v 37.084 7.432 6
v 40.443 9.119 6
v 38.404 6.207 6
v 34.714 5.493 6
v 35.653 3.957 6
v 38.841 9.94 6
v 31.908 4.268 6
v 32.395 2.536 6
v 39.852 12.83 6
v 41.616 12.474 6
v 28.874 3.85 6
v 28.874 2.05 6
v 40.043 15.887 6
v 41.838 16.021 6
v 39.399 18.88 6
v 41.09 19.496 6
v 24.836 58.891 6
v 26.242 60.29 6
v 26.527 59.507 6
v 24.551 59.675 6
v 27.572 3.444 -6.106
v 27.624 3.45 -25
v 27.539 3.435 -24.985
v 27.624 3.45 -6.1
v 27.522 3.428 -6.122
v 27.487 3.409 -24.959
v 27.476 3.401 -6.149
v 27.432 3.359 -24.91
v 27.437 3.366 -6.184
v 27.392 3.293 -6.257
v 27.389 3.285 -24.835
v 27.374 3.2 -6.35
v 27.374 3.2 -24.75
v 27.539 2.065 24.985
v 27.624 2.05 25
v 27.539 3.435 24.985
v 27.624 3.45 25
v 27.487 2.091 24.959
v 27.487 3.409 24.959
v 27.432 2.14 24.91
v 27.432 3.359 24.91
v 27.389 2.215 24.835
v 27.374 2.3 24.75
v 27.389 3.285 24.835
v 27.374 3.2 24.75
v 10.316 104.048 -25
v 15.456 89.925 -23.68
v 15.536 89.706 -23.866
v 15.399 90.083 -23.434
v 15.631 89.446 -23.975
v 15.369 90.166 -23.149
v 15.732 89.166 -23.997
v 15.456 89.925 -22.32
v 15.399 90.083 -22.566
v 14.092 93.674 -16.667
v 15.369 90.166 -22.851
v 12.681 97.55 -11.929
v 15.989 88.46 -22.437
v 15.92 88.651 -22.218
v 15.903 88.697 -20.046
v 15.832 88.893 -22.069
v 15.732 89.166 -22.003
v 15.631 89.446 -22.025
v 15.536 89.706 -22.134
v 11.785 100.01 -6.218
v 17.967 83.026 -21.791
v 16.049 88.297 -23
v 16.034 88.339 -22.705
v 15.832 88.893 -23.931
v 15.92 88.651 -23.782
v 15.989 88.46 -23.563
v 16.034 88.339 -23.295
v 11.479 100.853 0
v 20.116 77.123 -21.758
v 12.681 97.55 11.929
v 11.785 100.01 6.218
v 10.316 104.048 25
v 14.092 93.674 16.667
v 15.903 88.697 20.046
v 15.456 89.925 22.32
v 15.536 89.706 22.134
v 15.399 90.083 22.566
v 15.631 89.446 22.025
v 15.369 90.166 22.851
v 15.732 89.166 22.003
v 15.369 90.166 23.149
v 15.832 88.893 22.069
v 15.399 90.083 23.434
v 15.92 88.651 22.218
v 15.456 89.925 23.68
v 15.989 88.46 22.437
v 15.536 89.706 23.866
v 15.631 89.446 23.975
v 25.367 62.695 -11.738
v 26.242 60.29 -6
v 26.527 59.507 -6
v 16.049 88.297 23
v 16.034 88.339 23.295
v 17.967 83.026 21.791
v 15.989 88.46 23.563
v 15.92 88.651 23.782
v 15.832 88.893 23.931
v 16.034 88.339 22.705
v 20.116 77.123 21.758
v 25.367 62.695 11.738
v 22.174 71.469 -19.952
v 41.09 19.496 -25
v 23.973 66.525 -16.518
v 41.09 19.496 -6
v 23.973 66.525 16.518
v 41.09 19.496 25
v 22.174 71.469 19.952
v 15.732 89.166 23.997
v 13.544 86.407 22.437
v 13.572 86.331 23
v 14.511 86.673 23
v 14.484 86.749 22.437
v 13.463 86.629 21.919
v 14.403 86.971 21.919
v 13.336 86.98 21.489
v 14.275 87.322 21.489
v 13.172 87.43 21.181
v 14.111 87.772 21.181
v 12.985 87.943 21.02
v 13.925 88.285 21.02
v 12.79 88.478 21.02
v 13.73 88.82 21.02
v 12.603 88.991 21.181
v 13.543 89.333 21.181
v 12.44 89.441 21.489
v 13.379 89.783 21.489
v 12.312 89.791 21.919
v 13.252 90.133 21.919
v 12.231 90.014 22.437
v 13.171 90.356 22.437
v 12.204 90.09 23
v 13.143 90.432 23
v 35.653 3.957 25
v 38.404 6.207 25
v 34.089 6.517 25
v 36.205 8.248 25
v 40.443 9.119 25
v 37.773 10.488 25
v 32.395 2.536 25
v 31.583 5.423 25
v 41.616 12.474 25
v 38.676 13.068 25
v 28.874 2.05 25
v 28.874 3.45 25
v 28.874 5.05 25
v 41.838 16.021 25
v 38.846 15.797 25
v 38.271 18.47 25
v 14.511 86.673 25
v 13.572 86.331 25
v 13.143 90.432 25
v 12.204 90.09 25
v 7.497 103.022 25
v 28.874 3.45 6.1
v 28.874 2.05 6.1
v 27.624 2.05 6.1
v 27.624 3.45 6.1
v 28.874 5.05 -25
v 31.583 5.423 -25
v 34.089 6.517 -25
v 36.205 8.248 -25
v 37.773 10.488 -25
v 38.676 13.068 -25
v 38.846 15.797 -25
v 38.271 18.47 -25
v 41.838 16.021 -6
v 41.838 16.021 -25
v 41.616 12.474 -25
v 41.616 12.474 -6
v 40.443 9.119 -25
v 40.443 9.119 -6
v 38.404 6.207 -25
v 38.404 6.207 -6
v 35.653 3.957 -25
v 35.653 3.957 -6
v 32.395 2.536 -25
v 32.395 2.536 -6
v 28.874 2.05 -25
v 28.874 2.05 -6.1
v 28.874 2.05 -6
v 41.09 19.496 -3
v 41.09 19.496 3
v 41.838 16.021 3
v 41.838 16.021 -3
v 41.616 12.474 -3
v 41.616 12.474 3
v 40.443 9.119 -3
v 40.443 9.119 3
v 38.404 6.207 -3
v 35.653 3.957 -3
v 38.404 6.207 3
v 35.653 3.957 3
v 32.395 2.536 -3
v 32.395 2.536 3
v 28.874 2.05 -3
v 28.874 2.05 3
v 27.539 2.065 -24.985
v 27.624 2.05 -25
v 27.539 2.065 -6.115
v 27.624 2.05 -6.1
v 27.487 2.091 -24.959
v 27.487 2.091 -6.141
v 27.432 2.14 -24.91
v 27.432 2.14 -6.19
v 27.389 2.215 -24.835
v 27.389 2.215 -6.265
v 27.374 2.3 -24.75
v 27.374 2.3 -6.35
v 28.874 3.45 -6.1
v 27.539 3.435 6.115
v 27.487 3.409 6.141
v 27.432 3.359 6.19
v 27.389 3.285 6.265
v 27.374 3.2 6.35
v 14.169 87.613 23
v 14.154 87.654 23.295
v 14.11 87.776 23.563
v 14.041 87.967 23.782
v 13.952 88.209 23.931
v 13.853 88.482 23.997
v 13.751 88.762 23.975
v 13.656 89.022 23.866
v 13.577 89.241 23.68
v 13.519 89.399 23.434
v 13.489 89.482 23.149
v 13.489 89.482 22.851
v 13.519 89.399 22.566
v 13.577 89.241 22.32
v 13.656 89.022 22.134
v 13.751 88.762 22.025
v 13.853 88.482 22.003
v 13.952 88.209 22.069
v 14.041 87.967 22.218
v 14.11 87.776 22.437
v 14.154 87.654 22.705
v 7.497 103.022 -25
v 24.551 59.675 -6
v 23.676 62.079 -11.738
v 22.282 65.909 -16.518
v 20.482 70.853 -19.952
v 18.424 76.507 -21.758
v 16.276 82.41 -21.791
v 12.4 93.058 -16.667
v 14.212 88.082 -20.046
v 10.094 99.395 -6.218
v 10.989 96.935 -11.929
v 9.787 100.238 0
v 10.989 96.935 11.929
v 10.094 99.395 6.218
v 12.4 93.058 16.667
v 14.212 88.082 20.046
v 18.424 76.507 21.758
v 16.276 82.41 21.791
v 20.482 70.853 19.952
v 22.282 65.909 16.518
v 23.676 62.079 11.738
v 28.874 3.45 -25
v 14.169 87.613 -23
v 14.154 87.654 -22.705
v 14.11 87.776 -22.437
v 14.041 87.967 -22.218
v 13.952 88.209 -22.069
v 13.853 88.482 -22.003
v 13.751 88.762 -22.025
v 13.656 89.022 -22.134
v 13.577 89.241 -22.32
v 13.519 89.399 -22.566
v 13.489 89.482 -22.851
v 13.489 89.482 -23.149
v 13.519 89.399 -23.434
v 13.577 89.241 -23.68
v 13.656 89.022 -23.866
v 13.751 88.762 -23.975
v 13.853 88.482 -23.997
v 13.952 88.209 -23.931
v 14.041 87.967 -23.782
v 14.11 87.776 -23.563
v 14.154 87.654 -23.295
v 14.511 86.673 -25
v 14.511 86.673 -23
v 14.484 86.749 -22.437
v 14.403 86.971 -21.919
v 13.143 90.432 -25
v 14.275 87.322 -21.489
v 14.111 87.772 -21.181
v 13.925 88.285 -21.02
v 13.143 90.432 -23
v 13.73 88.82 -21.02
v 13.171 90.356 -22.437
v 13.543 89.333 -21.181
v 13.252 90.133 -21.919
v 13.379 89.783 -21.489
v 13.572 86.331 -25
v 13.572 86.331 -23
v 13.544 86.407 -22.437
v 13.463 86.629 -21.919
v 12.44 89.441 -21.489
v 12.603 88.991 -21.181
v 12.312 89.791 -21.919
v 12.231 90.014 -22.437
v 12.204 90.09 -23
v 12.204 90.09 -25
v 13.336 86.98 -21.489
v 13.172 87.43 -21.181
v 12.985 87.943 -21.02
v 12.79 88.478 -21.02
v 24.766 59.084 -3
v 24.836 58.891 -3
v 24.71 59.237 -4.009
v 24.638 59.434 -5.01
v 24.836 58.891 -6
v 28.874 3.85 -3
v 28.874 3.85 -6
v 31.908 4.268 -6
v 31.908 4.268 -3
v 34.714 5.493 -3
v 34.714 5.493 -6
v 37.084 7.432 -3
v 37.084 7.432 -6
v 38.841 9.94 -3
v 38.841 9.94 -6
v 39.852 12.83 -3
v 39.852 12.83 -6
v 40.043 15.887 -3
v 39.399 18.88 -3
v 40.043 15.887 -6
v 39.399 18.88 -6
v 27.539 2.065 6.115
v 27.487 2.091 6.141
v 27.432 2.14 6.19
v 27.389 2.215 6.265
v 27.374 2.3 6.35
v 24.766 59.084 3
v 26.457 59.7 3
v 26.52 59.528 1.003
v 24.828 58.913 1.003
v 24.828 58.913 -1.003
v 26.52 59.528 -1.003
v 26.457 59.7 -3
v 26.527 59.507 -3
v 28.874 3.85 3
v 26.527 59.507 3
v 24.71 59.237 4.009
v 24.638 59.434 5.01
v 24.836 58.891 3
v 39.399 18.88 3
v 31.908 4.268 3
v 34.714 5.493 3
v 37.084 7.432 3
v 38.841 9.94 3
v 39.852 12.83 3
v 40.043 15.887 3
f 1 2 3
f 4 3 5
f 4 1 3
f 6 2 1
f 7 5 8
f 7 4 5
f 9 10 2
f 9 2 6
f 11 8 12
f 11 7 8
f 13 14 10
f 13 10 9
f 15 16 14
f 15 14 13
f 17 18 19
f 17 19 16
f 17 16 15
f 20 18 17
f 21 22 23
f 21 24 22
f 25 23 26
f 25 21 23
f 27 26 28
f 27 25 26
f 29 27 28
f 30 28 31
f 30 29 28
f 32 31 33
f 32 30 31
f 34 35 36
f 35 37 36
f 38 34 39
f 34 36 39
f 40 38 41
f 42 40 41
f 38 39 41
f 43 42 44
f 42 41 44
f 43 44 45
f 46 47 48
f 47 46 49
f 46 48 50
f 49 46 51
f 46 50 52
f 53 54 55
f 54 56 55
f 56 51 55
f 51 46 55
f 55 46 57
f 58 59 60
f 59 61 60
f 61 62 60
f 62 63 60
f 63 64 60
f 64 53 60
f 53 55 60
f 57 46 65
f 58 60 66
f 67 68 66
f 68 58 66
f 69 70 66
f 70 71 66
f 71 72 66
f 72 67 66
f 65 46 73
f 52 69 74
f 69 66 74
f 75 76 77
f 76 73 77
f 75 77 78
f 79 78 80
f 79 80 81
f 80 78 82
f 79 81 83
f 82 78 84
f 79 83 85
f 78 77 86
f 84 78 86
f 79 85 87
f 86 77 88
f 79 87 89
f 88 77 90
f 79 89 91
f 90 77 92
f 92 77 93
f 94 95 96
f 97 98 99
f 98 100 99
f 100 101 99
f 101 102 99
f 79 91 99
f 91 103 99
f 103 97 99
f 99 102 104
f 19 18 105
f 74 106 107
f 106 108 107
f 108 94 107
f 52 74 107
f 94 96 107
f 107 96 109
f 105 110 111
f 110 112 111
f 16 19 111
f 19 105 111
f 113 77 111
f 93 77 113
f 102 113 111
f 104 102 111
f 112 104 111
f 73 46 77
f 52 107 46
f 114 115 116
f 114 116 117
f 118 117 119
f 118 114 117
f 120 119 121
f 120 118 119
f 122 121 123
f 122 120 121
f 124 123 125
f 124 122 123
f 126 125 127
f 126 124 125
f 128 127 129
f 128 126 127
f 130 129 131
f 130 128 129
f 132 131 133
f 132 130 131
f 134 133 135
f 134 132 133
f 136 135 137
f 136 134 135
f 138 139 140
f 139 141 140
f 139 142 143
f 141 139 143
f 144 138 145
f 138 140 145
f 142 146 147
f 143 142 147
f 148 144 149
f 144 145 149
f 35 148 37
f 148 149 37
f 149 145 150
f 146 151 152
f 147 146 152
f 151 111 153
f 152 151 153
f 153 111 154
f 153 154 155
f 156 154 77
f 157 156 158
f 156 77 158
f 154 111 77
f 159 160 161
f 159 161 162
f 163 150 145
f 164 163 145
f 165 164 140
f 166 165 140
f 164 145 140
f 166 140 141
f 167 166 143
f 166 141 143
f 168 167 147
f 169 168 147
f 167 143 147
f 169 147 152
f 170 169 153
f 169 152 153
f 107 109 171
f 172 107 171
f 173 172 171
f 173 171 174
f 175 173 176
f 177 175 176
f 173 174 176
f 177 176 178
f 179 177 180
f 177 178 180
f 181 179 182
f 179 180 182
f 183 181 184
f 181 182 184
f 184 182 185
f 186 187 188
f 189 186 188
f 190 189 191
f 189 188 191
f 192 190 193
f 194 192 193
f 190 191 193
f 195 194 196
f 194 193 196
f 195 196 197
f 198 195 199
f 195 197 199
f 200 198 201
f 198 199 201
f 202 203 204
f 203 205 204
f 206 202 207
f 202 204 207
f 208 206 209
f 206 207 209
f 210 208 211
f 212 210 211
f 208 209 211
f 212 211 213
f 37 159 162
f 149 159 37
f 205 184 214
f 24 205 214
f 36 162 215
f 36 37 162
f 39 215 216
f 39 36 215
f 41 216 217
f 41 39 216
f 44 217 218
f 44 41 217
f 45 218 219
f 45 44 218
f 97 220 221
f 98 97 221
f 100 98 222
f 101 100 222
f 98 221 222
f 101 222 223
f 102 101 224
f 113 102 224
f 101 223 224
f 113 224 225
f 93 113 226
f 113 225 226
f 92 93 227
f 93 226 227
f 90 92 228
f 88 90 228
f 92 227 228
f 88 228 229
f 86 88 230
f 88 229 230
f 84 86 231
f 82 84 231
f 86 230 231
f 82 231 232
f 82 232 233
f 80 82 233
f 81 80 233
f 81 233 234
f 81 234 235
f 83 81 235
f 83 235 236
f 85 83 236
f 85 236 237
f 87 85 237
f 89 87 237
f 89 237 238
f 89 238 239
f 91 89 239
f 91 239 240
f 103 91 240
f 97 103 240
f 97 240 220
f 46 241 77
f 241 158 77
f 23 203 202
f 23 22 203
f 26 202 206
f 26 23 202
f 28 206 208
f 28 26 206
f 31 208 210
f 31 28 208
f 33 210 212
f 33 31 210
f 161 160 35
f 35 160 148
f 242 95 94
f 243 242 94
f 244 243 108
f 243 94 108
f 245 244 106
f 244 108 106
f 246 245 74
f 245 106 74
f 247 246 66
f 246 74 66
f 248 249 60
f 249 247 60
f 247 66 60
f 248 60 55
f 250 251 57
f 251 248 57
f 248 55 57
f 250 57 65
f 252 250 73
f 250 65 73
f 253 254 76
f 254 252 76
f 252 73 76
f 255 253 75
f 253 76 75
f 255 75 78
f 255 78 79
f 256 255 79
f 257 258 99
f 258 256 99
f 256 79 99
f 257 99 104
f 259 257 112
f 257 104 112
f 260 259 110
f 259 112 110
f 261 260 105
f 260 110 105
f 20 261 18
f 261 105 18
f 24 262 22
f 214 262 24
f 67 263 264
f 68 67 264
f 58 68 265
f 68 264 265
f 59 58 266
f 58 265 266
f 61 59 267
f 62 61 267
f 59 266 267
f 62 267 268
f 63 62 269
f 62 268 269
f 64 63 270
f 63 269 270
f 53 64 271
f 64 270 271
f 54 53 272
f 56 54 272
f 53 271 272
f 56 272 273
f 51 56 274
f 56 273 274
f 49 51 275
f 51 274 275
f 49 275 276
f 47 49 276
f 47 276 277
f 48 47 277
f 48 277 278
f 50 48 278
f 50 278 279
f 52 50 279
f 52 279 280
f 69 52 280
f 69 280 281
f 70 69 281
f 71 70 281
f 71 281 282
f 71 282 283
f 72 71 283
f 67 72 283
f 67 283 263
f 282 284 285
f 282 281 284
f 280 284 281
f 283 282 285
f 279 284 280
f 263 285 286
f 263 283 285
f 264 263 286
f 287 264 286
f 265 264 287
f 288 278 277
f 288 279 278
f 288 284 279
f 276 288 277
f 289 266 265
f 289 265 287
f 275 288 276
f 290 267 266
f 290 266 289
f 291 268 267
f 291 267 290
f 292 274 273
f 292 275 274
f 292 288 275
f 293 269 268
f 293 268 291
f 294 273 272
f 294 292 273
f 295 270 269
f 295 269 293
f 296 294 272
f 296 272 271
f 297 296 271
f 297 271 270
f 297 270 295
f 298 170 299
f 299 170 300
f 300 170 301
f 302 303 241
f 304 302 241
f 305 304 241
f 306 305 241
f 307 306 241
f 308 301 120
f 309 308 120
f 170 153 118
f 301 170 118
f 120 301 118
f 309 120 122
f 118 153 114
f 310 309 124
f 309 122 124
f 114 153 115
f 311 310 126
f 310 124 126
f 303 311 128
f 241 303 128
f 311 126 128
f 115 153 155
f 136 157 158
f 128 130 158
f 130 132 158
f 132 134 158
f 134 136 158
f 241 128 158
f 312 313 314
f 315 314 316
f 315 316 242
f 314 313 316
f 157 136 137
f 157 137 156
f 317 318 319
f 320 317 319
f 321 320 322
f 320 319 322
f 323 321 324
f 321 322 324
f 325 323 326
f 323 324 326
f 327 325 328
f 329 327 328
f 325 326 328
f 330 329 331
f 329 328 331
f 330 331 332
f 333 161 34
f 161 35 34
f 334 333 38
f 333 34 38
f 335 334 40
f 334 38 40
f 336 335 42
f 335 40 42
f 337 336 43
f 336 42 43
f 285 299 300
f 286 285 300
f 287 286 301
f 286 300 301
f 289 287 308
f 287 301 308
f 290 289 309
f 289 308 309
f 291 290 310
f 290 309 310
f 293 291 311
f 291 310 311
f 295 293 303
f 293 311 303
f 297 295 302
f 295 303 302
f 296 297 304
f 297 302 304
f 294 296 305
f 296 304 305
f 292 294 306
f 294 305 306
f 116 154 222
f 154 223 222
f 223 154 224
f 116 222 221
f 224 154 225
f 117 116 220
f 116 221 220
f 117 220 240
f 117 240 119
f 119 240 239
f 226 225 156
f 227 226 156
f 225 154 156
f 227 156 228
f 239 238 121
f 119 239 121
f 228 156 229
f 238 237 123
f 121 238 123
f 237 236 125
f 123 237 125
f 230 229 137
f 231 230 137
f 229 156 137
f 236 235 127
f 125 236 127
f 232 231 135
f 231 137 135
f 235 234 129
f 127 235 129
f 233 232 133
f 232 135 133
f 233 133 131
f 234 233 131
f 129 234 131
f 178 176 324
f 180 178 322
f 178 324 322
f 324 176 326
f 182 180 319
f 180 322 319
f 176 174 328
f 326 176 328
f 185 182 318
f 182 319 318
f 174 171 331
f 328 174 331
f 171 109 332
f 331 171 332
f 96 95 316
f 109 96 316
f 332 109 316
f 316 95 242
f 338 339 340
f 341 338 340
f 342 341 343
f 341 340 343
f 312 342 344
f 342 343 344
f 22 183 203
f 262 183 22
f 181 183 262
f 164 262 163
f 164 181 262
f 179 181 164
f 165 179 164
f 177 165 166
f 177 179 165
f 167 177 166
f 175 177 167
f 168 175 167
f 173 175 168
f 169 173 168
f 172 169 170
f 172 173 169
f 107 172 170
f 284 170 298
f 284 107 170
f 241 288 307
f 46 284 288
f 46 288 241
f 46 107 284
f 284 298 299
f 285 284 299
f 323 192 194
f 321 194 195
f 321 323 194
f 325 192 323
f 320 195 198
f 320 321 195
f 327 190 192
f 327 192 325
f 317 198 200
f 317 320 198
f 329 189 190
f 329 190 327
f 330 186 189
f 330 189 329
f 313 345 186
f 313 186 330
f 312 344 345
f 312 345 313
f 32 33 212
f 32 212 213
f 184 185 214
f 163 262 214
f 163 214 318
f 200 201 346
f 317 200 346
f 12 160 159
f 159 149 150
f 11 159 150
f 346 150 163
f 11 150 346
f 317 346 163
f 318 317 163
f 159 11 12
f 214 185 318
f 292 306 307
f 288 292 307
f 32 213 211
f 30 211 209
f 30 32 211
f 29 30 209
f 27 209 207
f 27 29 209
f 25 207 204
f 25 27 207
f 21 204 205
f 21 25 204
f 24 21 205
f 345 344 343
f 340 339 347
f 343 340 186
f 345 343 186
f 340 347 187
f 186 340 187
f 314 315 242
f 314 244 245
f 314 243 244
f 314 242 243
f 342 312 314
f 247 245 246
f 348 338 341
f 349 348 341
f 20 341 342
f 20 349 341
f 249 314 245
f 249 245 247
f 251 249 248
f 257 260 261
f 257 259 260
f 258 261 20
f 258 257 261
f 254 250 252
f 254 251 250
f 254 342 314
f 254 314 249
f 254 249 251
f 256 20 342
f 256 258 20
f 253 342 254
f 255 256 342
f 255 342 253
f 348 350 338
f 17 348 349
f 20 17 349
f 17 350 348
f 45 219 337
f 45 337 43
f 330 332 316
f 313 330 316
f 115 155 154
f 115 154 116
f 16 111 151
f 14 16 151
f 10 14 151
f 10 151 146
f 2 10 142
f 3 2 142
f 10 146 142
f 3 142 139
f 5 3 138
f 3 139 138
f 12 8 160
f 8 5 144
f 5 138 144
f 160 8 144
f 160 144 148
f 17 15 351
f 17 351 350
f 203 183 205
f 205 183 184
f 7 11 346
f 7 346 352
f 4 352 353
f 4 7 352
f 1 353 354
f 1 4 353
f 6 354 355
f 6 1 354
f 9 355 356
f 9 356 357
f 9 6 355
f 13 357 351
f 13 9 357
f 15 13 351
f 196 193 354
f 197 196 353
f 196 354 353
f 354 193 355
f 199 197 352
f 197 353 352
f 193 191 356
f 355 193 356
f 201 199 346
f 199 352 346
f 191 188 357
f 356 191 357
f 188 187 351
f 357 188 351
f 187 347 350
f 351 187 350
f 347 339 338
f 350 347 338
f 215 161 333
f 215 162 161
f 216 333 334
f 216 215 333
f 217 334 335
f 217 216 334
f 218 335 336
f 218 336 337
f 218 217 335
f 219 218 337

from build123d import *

# Parameters (mm, degrees)
EXTRUDE_1_DEPTH        = 25
SKETCH_4_R             = 22
CUT_EXTRUDE_1_DEPTH    = 1.8
CUT_EXTRUDE_START      = 6
CUT_EXTRUDE_1_2_DEPTH  = 3
SKETCH_11_W            = 18.9
SKETCH_11_H            = 1.4
EXTRUDE_3_DEPTH        = 1.5
FILLET_1_R             = 0.25
SKETCH_12_R            = 1
CUT_EXTRUDE_2553_DEPTH = 99.437390504
CUT_EXTRUDE_1_3_DEPTH  = 1


with BuildPart() as part:
    # 草图2 → 整体拉伸-薄壁1 (new, symmetric)
    with BuildSketch(Plane.XY):
        with BuildLine():
            ThreePointArc((28.874192719, 5.049687275), (37.065713162, 9.313922912), (38.271118927, 18.469888708))
            Line((38.271118927, 18.469888708), (7.496652644, 103.022039918))
            Line((7.496652644, 103.022039918), (10.315730506, 104.048100348))
            Line((10.315730506, 104.048100348), (41.090196789, 19.495949138))
            ThreePointArc((41.090196789, 19.495949138), (39.523169295, 7.593193603), (28.874192719, 2.049687275))
            Line((28.874192719, 2.049687275), (28.874192719, 5.049687275))
        make_face()
    extrude(amount=EXTRUDE_1_DEPTH, both=True)

    # 草图4 → Cut-Extrude 1 (cut)
    with BuildSketch(Plane(origin=(42.549434126, 15.486727507, 0), x_dir=(0, 0, -1), z_dir=(0.9396926207859071, 0.3420201433256726, 0))):
        with Locations(Location((0, 68.845044478, 0), (0, 0, 90))):
            Circle(SKETCH_4_R)
    extrude(amount=-CUT_EXTRUDE_1_DEPTH, mode=Mode.SUBTRACT)

    # 草图3 → Cut-Extrude 1 2 (cut)
    with BuildSketch(Plane.XY.offset(CUT_EXTRUDE_START)):
        with BuildLine():
            ThreePointArc((28.874192719, 3.849687275), (38.048695615, 8.625631188), (39.398750072, 18.88031288))
            Line((39.398750072, 18.88031288), (24.836038582, 58.891033865))
            Line((24.836038582, 58.891033865), (23.809978152, 61.710111727))
            Line((23.809978152, 61.710111727), (25.50142487, 62.325747985))
            Line((25.50142487, 62.325747985), (26.5274853, 59.506670123))
            Line((26.5274853, 59.506670123), (41.090196789, 19.495949138))
            ThreePointArc((41.090196789, 19.495949138), (39.523169295, 7.593193603), (28.874192719, 2.049687275))
            Line((28.874192719, 2.049687275), (28.874192719, 3.849687275))
        make_face()
    cut_extrude_1_2 = extrude(amount=-CUT_EXTRUDE_1_2_DEPTH, mode=Mode.SUBTRACT)

    # 镜向1: Cut-Extrude 1 2 across plane
    add(cut_extrude_1_2.mirror(Plane.XY), mode=Mode.SUBTRACT)

    # 草图11 → 底部卡扣凸台-拉伸3 (add)
    with BuildSketch(Plane.ZY.offset(-28.874192719)):
        with Locations((-15.55, 2.749687275)):
            Rectangle(SKETCH_11_W, SKETCH_11_H)
        with Locations((15.55, 2.749687275)):
            Rectangle(SKETCH_11_W, SKETCH_11_H)
    extrude(amount=EXTRUDE_3_DEPTH)

    # 底部卡扣圆角1
    fillet_1_edges = [part.edges().sort_by_distance(p)[0] for p in [
        (27.374192719, 2.749687275, -25),
        (27.374192719, 2.049687275, -15.55),
        (27.374192719, 2.749687275, -6.1),
        (27.374192719, 3.449687275, -15.55),
        (27.374192719, 2.749687275, 6.1),
        (27.374192719, 2.049687275, 15.55),
        (27.374192719, 2.749687275, 25),
        (27.374192719, 3.449687275, 15.55),
    ]]
    fillet(fillet_1_edges, radius=FILLET_1_R)

    # 草图12 → Cut-Extrude 2553 (cut, through all)
    with BuildSketch(Plane(origin=(39.730356264, 14.460667077, 0), x_dir=(0, 0, 1), z_dir=(-0.9396926207859071, -0.3420201433256726, 0))):
        with Locations(Location((23, 78.482840932, 0), (0, 0, 270))):
            Circle(SKETCH_12_R)
        with Locations(Location((-23, 78.482840932, 0), (0, 0, 270))):
            Circle(SKETCH_12_R)
    extrude(amount=-CUT_EXTRUDE_2553_DEPTH, mode=Mode.SUBTRACT)

    # 草图13 → Cut-Extrude 1 3 (cut)
    with BuildSketch(Plane(origin=(39.730356264, 14.460667077, 0), x_dir=(0, 0, 1), z_dir=(-0.9396926207859071, -0.3420201433256726, 0))):
        with BuildLine():
            Line((23, 80.482840932), (25, 80.482840932))
            Line((25, 80.482840932), (25, 76.482840932))
            Line((25, 76.482840932), (23, 76.482840932))
            ThreePointArc((23, 76.482840932), (21, 78.482840932), (23, 80.482840932))
        make_face()
        with BuildLine():
            Line((-25, 80.482840932), (-25, 76.482840932))
            Line((-25, 76.482840932), (-23, 76.482840932))
            ThreePointArc((-23, 76.482840932), (-21, 78.482840932), (-23, 80.482840932))
            Line((-23, 80.482840932), (-25, 80.482840932))
        make_face()
    extrude(amount=-CUT_EXTRUDE_1_3_DEPTH, mode=Mode.SUBTRACT)


solid = part.part
